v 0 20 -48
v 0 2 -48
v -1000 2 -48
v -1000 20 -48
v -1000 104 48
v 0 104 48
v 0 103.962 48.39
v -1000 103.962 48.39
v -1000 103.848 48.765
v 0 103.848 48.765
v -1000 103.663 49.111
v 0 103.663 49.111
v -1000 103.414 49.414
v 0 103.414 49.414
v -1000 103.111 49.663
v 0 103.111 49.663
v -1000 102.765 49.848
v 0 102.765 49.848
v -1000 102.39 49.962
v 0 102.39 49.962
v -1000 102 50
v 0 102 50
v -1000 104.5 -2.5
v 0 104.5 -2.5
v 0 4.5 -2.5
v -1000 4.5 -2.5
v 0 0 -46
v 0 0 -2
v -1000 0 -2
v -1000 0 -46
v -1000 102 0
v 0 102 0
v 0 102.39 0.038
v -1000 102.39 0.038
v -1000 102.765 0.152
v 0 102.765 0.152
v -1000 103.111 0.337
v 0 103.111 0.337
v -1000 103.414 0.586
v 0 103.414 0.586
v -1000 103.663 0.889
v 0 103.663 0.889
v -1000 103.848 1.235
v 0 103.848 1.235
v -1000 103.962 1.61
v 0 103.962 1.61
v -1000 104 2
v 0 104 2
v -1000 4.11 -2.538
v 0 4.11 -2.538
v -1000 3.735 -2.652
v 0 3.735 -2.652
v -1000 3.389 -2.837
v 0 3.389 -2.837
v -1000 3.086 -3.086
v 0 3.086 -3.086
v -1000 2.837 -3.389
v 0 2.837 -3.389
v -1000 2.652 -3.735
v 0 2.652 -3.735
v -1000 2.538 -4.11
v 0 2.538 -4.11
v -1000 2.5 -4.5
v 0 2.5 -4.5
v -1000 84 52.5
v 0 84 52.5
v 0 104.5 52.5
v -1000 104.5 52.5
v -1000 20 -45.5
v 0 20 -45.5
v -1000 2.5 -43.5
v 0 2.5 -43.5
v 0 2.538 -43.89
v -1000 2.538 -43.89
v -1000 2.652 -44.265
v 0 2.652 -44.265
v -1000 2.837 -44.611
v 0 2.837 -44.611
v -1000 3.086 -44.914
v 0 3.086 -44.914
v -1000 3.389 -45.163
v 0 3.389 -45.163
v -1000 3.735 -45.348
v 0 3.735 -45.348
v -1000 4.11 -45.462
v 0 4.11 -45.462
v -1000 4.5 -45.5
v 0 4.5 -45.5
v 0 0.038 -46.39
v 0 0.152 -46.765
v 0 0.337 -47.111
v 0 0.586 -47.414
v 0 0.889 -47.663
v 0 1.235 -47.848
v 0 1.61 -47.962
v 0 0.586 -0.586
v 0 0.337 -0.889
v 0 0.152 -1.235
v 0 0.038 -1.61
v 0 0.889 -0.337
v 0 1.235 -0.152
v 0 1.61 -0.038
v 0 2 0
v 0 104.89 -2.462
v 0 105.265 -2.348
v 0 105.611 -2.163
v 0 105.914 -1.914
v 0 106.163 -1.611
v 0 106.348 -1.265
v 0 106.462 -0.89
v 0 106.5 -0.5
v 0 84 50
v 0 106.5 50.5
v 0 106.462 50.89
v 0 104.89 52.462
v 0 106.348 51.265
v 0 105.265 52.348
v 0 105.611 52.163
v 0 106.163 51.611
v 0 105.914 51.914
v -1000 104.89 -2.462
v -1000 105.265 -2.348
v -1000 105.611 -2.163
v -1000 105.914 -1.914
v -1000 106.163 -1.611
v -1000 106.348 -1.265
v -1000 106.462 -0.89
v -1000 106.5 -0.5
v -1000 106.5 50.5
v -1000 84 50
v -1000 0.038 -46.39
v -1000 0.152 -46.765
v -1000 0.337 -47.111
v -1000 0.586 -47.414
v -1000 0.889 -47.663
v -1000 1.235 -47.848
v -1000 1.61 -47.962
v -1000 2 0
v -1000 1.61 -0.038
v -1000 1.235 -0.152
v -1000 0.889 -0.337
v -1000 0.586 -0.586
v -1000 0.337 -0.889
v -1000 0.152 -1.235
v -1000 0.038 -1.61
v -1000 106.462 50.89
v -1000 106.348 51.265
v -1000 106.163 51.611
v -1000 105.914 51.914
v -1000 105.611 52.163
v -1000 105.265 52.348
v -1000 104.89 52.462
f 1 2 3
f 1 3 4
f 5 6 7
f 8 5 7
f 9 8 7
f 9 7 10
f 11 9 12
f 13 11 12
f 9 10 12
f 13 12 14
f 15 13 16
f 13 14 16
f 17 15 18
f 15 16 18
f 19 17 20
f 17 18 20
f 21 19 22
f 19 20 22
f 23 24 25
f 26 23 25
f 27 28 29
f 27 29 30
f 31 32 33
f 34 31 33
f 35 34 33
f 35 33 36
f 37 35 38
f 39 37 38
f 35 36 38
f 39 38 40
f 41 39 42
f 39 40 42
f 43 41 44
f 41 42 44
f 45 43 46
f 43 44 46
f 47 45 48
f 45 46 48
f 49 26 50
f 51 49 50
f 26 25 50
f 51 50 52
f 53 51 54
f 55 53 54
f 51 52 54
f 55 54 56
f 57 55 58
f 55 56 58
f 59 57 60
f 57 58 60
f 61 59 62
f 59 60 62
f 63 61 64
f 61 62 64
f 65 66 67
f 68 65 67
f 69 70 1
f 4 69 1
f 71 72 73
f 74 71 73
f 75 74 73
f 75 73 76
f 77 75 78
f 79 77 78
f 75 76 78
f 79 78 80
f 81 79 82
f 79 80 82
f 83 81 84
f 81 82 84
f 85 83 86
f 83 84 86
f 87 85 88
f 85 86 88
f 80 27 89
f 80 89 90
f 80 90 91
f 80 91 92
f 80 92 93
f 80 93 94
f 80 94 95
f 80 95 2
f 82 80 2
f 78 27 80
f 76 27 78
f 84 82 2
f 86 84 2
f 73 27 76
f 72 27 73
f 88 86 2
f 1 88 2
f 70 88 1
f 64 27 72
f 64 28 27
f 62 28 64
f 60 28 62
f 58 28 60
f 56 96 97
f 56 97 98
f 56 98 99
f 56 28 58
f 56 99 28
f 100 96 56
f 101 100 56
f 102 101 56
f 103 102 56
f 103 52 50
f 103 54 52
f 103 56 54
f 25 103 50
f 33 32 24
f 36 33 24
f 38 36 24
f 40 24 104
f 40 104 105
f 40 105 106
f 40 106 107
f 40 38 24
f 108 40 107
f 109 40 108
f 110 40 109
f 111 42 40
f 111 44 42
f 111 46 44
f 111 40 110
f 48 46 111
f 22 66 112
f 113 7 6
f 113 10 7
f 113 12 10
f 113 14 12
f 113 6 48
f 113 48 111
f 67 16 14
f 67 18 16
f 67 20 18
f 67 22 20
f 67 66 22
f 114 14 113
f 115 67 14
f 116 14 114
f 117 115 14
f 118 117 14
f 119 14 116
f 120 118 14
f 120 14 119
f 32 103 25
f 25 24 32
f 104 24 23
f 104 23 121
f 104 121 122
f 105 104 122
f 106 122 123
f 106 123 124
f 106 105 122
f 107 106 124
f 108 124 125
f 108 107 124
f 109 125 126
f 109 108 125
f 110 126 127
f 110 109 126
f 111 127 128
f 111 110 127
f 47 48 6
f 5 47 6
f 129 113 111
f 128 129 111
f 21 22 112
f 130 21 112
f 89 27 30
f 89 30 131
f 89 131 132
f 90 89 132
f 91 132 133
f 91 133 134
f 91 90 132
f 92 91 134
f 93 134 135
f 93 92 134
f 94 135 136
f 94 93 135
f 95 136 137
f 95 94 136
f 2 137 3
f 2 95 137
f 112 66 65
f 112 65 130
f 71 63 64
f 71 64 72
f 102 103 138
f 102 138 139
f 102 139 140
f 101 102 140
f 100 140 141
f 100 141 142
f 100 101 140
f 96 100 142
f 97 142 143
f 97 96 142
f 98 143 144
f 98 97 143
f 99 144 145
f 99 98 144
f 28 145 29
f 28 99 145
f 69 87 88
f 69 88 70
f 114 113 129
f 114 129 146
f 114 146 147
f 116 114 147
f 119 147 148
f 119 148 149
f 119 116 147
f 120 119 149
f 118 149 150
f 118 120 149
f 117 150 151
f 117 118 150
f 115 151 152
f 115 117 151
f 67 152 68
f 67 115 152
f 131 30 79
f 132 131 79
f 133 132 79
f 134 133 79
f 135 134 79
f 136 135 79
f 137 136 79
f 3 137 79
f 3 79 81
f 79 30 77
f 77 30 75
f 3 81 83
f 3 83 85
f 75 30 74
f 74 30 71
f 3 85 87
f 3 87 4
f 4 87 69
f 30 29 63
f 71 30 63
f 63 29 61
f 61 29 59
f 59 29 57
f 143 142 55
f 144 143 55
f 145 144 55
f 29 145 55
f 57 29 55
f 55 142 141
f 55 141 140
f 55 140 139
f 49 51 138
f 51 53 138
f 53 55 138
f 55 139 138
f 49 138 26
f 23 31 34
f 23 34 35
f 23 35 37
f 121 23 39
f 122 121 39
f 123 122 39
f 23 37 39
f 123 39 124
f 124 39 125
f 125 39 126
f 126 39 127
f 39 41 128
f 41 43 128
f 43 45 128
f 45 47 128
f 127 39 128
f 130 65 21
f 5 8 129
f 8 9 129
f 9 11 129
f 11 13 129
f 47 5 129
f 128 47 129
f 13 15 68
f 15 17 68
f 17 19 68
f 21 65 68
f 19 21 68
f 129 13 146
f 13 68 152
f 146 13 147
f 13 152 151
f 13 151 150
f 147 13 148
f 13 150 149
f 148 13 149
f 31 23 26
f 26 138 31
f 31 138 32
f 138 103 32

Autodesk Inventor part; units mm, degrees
ref_plane "YZ Plane" through (0, 0, 0) normal (1, 0, 0) x (0, 1, 0)
ref_plane "XZ Plane" through (0, 0, 0) normal (0, 1, 0) x (-1, 0, 0)
ref_plane "XY Plane" through (0, 0, 0) normal (0, 0, 1) x (1, 0, 0)
sketch "Sketch1" plane through (0, 0, 0) normal (1, 0, 0) x (0, 1, 0)
  line L0 (2, 0) -> (102, 0)
  line L1 (0, -2) -> (0, -46)
  line L2 (104, 2) -> (104, 48)
  line L3 (2, -48) -> (20, -48)
  line L4 (102, 50) -> (84, 50)
  line L5 (84, 52.5) -> (104.5, 52.5)
  line L6 (106.5, 50.5) -> (106.5, -0.5)
  line L7 (104.5, -2.5) -> (4.5, -2.5)
  line L8 (2.5, -4.5) -> (2.5, -43.5)
  line L9 (4.5, -45.5) -> (20, -45.5)
  line L10 (84, 52.5) -> (84, 50)
  line L11 (20, -45.5) -> (20, -48)
  arc A0 (104, 48) -> (102, 50) centre (102, 48) ccw
  arc A1 (106.5, 50.5) -> (104.5, 52.5) centre (104.5, 50.5) ccw
  arc A2 (102, 0) -> (104, 2) centre (102, 2) ccw
  arc A3 (104.5, -2.5) -> (106.5, -0.5) centre (104.5, -0.5) ccw
  arc A4 (2, 0) -> (0, -2) centre (2, -2) ccw
  arc A5 (4.5, -2.5) -> (2.5, -4.5) centre (4.5, -4.5) ccw
  arc A6 (2.5, -43.5) -> (4.5, -45.5) centre (4.5, -43.5) ccw
  arc A7 (0, -46) -> (2, -48) centre (2, -46) ccw
  point P0 (0, 0)
  point P1 (104, 0)
  point P2 (0, -48)
  point P3 (104, 50)
  point P4 (106.5, 52.5)
  point P5 (106.5, -2.5)
  point P6 (2.5, -2.5)
  point P7 (2.5, -45.5)
  dimension "d0" = 104
  dimension "d1" = 48
  dimension "d2" = 50
  dimension "d3" = 20
  dimension "d4" = 20
  dimension "d5" = 2.5
  dimension "d8" = 2
extrude "Extrusion1" add sketch "Sketch1" against normal blind 1000
properties part number "PerfilZ"
